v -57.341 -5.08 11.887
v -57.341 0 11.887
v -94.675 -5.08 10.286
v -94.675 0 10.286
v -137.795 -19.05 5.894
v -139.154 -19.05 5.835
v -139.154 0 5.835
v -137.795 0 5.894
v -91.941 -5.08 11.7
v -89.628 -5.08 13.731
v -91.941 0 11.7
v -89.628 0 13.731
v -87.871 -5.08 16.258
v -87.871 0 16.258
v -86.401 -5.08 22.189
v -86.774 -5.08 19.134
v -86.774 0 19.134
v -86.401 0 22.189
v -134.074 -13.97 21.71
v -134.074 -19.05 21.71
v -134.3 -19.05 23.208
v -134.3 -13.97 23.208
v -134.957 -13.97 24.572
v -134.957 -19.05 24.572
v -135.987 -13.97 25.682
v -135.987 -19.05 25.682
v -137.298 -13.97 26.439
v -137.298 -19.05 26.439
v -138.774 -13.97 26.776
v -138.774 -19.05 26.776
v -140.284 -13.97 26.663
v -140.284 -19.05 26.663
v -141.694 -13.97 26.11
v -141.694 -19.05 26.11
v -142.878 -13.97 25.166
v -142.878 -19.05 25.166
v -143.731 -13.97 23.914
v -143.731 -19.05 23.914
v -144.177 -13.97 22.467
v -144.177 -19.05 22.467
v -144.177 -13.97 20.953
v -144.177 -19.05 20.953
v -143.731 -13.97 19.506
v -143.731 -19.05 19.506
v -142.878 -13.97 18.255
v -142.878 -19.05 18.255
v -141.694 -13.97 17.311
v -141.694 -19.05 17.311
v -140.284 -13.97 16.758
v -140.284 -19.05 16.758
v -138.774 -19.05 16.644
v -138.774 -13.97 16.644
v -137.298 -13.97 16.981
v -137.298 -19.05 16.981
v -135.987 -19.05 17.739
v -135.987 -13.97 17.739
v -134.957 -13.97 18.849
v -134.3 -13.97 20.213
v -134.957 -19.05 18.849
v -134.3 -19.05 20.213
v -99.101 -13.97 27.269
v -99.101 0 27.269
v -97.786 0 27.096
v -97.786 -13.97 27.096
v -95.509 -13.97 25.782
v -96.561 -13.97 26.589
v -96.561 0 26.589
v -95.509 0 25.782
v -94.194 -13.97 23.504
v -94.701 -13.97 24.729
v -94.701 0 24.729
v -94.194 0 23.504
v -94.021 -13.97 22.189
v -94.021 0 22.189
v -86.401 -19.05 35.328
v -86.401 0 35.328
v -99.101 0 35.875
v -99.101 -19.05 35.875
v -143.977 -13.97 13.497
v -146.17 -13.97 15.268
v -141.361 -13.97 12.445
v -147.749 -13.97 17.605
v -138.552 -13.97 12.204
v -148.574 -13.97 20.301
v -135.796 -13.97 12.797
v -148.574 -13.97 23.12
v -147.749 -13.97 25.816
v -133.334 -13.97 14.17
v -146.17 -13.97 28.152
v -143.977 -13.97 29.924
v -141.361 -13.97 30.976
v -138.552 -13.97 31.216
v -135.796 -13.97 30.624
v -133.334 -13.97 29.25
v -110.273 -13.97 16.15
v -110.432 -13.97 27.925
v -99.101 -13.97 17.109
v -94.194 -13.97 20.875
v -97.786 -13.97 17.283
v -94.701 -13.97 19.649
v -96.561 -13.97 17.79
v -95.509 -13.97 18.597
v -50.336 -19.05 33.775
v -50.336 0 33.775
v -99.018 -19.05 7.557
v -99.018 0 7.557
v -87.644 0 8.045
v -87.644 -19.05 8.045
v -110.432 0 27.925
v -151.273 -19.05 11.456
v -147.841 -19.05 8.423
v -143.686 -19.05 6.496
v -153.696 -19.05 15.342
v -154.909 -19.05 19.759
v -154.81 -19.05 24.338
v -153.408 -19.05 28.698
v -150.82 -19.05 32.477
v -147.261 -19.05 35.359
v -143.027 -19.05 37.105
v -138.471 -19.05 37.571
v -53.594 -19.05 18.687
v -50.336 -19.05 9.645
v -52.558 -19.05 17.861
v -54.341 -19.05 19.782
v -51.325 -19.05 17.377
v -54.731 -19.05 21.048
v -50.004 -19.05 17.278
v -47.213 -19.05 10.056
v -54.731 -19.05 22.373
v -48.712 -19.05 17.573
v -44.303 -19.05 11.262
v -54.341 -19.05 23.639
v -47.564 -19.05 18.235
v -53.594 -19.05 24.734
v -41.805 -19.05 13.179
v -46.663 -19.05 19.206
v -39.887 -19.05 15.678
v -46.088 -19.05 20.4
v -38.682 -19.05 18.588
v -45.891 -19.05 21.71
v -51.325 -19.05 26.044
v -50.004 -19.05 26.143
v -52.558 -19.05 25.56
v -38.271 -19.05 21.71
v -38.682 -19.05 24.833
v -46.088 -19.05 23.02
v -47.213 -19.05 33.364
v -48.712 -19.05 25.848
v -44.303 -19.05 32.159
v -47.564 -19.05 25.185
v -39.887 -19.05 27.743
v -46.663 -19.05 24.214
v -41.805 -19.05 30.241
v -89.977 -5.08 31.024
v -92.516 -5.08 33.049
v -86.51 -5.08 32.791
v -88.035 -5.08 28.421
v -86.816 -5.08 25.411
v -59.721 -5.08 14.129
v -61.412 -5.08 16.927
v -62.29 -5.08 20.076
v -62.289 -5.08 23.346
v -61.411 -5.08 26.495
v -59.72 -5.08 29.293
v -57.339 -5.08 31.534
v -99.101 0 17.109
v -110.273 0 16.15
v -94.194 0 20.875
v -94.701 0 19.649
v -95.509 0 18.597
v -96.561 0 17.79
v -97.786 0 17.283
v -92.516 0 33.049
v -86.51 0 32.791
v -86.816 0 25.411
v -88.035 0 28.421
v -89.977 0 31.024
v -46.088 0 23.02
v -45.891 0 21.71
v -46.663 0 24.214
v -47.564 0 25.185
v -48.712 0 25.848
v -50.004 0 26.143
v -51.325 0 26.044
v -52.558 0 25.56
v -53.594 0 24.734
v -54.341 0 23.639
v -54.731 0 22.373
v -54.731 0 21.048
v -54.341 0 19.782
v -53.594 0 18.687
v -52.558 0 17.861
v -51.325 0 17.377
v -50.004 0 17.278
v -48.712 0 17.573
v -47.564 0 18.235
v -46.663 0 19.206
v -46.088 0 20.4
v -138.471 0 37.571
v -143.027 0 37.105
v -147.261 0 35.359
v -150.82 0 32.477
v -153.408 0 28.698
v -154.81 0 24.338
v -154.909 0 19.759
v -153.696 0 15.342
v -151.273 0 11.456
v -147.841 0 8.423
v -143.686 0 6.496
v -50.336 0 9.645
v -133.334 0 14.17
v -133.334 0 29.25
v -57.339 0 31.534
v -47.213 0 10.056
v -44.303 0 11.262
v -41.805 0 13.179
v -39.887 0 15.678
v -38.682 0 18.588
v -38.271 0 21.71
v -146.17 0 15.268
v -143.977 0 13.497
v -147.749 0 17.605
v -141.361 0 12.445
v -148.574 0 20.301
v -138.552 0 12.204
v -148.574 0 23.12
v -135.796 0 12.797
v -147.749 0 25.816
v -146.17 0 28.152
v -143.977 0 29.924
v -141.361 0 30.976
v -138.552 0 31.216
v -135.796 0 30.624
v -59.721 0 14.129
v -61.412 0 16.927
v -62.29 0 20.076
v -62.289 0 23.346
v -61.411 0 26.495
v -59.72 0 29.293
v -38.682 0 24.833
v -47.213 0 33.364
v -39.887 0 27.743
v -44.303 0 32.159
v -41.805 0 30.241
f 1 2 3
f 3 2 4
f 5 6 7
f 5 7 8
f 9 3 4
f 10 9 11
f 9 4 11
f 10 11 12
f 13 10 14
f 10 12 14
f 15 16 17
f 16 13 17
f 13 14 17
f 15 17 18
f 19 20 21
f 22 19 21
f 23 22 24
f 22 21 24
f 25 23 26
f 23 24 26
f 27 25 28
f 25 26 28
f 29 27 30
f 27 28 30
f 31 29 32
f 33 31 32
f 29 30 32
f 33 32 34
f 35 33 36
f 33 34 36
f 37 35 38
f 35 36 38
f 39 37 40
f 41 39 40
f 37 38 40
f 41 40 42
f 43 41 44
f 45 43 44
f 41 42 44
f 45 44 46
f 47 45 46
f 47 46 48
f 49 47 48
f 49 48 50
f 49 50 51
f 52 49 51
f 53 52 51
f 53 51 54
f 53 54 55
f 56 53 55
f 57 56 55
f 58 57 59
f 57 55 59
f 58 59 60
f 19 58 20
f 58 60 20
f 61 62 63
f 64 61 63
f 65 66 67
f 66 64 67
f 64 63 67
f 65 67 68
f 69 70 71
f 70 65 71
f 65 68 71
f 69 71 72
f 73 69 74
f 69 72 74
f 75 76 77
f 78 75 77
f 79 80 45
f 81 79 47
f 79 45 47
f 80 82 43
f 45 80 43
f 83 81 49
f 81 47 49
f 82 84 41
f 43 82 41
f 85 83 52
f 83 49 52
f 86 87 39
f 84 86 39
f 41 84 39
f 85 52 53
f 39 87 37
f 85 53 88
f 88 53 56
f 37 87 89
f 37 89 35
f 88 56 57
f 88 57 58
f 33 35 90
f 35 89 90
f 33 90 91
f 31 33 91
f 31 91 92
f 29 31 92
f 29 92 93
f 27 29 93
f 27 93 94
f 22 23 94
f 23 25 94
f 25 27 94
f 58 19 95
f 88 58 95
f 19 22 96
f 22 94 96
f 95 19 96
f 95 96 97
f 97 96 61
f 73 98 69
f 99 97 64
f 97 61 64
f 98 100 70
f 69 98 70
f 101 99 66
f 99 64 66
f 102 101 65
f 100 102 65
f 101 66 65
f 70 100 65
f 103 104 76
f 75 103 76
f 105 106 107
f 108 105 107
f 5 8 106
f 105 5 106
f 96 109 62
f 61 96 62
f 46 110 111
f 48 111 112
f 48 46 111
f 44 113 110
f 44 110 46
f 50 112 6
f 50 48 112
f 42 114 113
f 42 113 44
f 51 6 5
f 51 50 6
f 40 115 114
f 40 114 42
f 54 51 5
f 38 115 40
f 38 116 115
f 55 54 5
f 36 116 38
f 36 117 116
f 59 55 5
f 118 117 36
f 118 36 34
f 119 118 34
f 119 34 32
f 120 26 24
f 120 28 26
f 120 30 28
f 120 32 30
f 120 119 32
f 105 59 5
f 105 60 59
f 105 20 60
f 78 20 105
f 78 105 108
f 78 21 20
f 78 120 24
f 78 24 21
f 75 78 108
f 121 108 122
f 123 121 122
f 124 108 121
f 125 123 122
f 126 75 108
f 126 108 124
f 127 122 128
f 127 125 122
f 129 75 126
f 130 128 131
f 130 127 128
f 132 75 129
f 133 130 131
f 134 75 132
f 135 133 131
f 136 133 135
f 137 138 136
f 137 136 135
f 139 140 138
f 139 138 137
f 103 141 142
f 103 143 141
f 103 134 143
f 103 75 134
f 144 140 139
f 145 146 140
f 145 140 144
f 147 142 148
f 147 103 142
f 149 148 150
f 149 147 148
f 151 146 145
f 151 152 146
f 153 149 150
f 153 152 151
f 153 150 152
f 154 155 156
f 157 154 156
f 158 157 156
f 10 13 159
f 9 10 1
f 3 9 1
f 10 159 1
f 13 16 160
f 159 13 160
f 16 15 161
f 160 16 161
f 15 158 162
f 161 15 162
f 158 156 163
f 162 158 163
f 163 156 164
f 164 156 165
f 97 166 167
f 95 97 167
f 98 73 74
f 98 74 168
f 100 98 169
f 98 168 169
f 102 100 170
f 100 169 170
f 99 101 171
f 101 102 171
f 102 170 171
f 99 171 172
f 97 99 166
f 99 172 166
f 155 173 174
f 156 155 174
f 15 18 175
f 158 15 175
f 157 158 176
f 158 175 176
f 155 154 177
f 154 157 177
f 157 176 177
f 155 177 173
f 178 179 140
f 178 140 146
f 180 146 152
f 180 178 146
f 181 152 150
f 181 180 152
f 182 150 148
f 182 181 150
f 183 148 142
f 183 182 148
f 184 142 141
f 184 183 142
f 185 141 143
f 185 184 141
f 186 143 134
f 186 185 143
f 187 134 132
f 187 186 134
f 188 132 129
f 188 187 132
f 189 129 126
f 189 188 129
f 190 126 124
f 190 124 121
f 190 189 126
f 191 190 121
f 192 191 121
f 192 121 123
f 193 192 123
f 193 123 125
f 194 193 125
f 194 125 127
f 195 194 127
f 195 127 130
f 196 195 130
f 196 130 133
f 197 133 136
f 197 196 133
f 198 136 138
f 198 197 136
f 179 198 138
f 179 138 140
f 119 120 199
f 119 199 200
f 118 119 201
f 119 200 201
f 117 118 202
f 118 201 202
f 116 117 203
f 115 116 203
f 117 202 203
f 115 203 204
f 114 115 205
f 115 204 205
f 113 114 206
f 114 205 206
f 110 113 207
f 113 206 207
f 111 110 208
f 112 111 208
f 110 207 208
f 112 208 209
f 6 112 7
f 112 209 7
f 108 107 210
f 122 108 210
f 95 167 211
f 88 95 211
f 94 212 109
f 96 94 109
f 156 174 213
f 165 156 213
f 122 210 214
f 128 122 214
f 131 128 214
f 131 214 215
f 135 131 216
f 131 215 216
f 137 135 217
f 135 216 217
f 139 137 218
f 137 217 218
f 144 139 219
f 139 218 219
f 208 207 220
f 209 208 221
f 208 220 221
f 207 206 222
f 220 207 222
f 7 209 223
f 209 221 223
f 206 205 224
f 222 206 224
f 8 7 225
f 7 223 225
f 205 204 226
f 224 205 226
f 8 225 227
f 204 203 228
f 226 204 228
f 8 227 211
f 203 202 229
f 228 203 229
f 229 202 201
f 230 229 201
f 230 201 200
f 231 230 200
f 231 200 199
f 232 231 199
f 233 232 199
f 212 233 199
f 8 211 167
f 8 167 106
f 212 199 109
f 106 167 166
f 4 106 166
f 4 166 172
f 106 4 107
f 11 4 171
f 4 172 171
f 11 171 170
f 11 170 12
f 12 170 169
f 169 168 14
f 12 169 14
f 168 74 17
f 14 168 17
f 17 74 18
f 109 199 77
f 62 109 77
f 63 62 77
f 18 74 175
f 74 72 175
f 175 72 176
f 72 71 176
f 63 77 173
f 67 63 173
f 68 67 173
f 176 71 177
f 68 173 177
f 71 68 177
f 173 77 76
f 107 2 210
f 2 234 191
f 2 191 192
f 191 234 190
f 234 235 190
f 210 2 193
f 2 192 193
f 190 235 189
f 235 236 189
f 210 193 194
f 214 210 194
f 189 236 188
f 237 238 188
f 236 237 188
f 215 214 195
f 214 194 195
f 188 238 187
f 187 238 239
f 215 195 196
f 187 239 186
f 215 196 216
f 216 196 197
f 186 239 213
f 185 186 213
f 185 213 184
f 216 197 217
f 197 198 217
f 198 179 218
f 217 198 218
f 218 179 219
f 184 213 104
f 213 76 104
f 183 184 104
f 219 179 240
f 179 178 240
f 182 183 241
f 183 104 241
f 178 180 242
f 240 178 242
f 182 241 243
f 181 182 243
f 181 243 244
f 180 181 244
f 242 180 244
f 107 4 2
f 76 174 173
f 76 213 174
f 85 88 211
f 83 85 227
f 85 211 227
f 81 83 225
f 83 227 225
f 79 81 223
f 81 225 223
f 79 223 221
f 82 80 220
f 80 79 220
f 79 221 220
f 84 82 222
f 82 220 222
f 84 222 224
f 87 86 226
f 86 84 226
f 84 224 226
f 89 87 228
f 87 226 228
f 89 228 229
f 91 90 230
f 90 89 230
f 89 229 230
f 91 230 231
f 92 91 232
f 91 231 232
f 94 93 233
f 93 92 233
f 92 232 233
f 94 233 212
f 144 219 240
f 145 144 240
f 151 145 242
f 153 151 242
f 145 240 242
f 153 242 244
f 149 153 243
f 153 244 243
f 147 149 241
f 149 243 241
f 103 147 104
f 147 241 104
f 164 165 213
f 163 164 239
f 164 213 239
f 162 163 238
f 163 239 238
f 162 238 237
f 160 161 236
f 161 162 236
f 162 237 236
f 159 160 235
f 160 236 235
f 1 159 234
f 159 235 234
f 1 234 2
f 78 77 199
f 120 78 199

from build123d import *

# Parameters (mm, degrees)
F0_R     = 4.445
F1_DEPTH = 19.05
F3_DEPTH = 13.97
F4_R     = 5.08
F5_DEPTH = 5.08


with BuildPart() as f1:
    # F0 (on Front) → F1 (new body)
    with BuildSketch(Plane.XZ):
        with BuildLine():
            ThreePointArc((-124.9322268395, 28.7639294598), (-130.4980059639, 35.017678352), (-138.4710976488, 37.5705358593))
            ThreePointArc((-138.4710976488, 37.5705358593), (-155.0254015346, 22.0518028606), (-139.1540765762, 5.8352343242))
            Line((-139.1540765762, 5.8352343242), (-137.7946125004, 5.8935506507))
            ThreePointArc((-137.7946125004, 5.8935506507), (-130.1034423833, 8.6679321614), (-124.8131018813, 14.9019988847))
            Line((-124.8131018813, 14.9019988847), (-133.3336122029, 14.1704850261))
            ThreePointArc((-133.3336122029, 14.1704850261), (-148.6790765762, 21.7102343242), (-133.3336122029, 29.2499836224))
            Line((-133.3336122029, 29.2499836224), (-124.9322268395, 28.7639294598))
        make_face()
        with BuildLine():
            Line((-99.1008544222, 34.8894799677), (-99.1008544222, 35.8751666308))
            Line((-99.1008544222, 35.8751666308), (-138.4710976488, 37.5705358593))
            ThreePointArc((-138.4710976488, 37.5705358593), (-130.4980059639, 35.017678352), (-124.9322268395, 28.7639294598))
            Line((-124.9322268395, 28.7639294598), (-110.4319389367, 27.9250290893))
            ThreePointArc((-110.4319389367, 27.9250290893), (-105.7509869831, 33.0091720577), (-99.1008544222, 34.8894799677))
        make_face()
        with BuildLine():
            Line((-137.7946125004, 5.8935506507), (-99.0179549294, 7.5569357044))
            Line((-99.0179549294, 7.5569357044), (-99.1008544222, 9.4894799677))
            ThreePointArc((-99.1008544222, 9.4894799677), (-105.6044119808, 11.2810548255), (-110.273070294, 16.1503084588))
            Line((-110.273070294, 16.1503084588), (-124.8131018813, 14.9019988847))
            ThreePointArc((-124.8131018813, 14.9019988847), (-130.1034423833, 8.6679321614), (-137.7946125004, 5.8935506507))
        make_face()
        with BuildLine():
            ThreePointArc((-99.1008544222, 9.4894799677), (-96.8524942518, 9.6900849205), (-94.6751627721, 10.2855624017))
            ThreePointArc((-94.6751627721, 10.2855624017), (-88.6726167006, 14.9409036921), (-86.4008544222, 22.1894799677))
            Line((-86.4008544222, 22.1894799677), (-94.0208544222, 22.1894799677))
            ThreePointArc((-94.0208544222, 22.1894799677), (-95.5087519738, 18.5973775193), (-99.1008544222, 17.1094799677))
            Line((-99.1008544222, 17.1094799677), (-110.273070294, 16.1503084588))
            ThreePointArc((-110.273070294, 16.1503084588), (-105.6044119808, 11.2810548255), (-99.1008544222, 9.4894799677))
        make_face()
        with BuildLine():
            ThreePointArc((-86.4008544222, 22.1894799677), (-88.0348602906, 28.4211550137), (-92.5164093638, 33.0492720132))
            ThreePointArc((-92.5164093638, 33.0492720132), (-95.6824746143, 34.4207791419), (-99.1008544222, 34.8894799677))
            ThreePointArc((-99.1008544222, 34.8894799677), (-105.7509869831, 33.0091720577), (-110.4319389367, 27.9250290893))
            Line((-110.4319389367, 27.9250290893), (-99.1008544222, 27.2694799677))
            ThreePointArc((-99.1008544222, 27.2694799677), (-95.5087519738, 25.7815824161), (-94.0208544222, 22.1894799677))
            Line((-94.0208544222, 22.1894799677), (-86.4008544222, 22.1894799677))
        make_face()
        with BuildLine():
            Line((-99.0179549294, 7.5569357044), (-87.6442336226, 8.0448291746))
            Line((-87.6442336226, 8.0448291746), (-87.7530907655, 10.5824954495))
            Line((-87.7530907655, 10.5824954495), (-94.6751627721, 10.2855624017))
            ThreePointArc((-94.6751627721, 10.2855624017), (-96.8524942518, 9.6900849205), (-99.1008544222, 9.4894799677))
            Line((-99.1008544222, 9.4894799677), (-99.0179549294, 7.5569357044))
        make_face()
        with BuildLine():
            Line((-86.5101311345, 32.7906284679), (-86.4008544222, 35.3282767099))
            Line((-86.4008544222, 35.3282767099), (-99.1008544222, 35.8751666308))
            Line((-99.1008544222, 35.8751666308), (-99.1008544222, 34.8894799677))
            ThreePointArc((-99.1008544222, 34.8894799677), (-95.6824746143, 34.4207791419), (-92.5164093638, 33.0492720132))
            Line((-92.5164093638, 33.0492720132), (-86.5101311345, 32.7906284679))
        make_face()
        with BuildLine():
            ThreePointArc((-57.3392350777, 31.5344655517), (-54.0123637648, 33.2013955962), (-50.3357569569, 33.7752343242))
            Line((-50.3357569569, 33.7752343242), (-86.4008544222, 35.3282767099))
            Line((-86.4008544222, 35.3282767099), (-86.5101311345, 32.7906284679))
            Line((-86.5101311345, 32.7906284679), (-57.3392350777, 31.5344655517))
        make_face()
        with BuildLine():
            Line((-87.6442336226, 8.0448291746), (-50.3357569569, 9.6452343242))
            ThreePointArc((-50.3357569569, 9.6452343242), (-54.0132473827, 10.2193558039), (-57.3407458906, 11.8870802972))
            Line((-57.3407458906, 11.8870802972), (-87.7530907655, 10.5824954495))
            Line((-87.7530907655, 10.5824954495), (-87.6442336226, 8.0448291746))
        make_face()
        with BuildLine():
            ThreePointArc((-50.3357569569, 9.6452343242), (-41.8045136419, 13.1789910092), (-38.2707569569, 21.7102343242))
            ThreePointArc((-38.2707569569, 21.7102343242), (-41.8045136419, 30.2414776392), (-50.3357569569, 33.7752343242))
            ThreePointArc((-50.3357569569, 33.7752343242), (-54.0123637648, 33.2013955962), (-57.3392350777, 31.5344655517))
            ThreePointArc((-57.3392350777, 31.5344655517), (-62.4007569212, 21.7111620791), (-57.3407458906, 11.8870802972))
            ThreePointArc((-57.3407458906, 11.8870802972), (-54.0132473827, 10.2193558039), (-50.3357569569, 9.6452343242))
        make_face()
        with Locations((-50.3357569569, 21.7102343242)):
            Circle(F0_R, mode=Mode.SUBTRACT)
    extrude(amount=F1_DEPTH)

    # F2 (on face) → F3 (join)
    with BuildSketch(Plane.XZ.offset(19.05)):
        with BuildLine():
            ThreePointArc((-86.4008544222, 22.1894799677), (-88.6726167006, 14.9409036921), (-94.6751627721, 10.2855624017))
            Line((-94.6751627721, 10.2855624017), (-57.3407458906, 11.8870802972))
            ThreePointArc((-57.3407458906, 11.8870802972), (-62.4007569212, 21.7111620791), (-57.3392350777, 31.5344655517))
            Line((-57.3392350777, 31.5344655517), (-92.5164093638, 33.0492720132))
            ThreePointArc((-92.5164093638, 33.0492720132), (-88.0348602906, 28.4211550137), (-86.4008544222, 22.1894799677))
        make_face()
        with BuildLine():
            Line((-57.3407458906, 11.8870802972), (-94.6751627721, 10.2855624017))
            ThreePointArc((-94.6751627721, 10.2855624017), (-103.5704974557, 10.301995324), (-110.273070294, 16.1503084588))
            Line((-110.273070294, 16.1503084588), (-133.3336122029, 14.1704850261))
            ThreePointArc((-133.3336122029, 14.1704850261), (-148.6790765762, 21.7102343242), (-133.3336122029, 29.2499836224))
            Line((-133.3336122029, 29.2499836224), (-110.4319389367, 27.9250290893))
            ThreePointArc((-110.4319389367, 27.9250290893), (-102.5932909524, 34.3998397938), (-92.5164093638, 33.0492720132))
            Line((-92.5164093638, 33.0492720132), (-57.3392350777, 31.5344655517))
            ThreePointArc((-57.3392350777, 31.5344655517), (-54.0123637648, 33.2013955962), (-50.3357569569, 33.7752343242))
            Line((-50.3357569569, 33.7752343242), (-138.4710976488, 37.5705358593))
            ThreePointArc((-138.4710976488, 37.5705358593), (-155.0254015346, 22.0518028606), (-139.1540765762, 5.8352343242))
            Line((-139.1540765762, 5.8352343242), (-50.3357569569, 9.6452343242))
            ThreePointArc((-50.3357569569, 9.6452343242), (-54.0132473827, 10.2193558039), (-57.3407458906, 11.8870802972))
        make_face()
    extrude(amount=-F3_DEPTH)

    # F4 (on face) → F5 (join)
    with BuildSketch(Plane.XZ.offset(19.05)):
        with BuildLine():
            ThreePointArc((-133.3336122029, 29.2499836224), (-148.6790765762, 21.7102343242), (-133.3336122029, 14.1704850261))
            ThreePointArc((-133.3336122029, 14.1704850261), (-130.6052302168, 17.5098949424), (-129.6290765762, 21.7102343242))
            ThreePointArc((-129.6290765762, 21.7102343242), (-130.6052302168, 25.910573706), (-133.3336122029, 29.2499836224))
        make_face()
        with Locations((-139.1540765762, 21.7102343242)):
            Circle(F4_R, mode=Mode.SUBTRACT)
        with BuildLine():
            ThreePointArc((-129.6290765762, 21.7102343242), (-130.6052302168, 17.5098949424), (-133.3336122029, 14.1704850261))
            Line((-133.3336122029, 14.1704850261), (-99.1008544222, 17.1094799677))
            ThreePointArc((-99.1008544222, 17.1094799677), (-104.1808544222, 22.1894799677), (-99.1008544222, 27.2694799677))
            Line((-99.1008544222, 27.2694799677), (-133.3336122029, 29.2499836224))
            ThreePointArc((-133.3336122029, 29.2499836224), (-130.6052302168, 25.910573706), (-129.6290765762, 21.7102343242))
        make_face()
        with BuildLine():
            ThreePointArc((-99.1008544222, 27.2694799677), (-104.1808544222, 22.1894799677), (-99.1008544222, 17.1094799677))
            ThreePointArc((-99.1008544222, 17.1094799677), (-95.5087519738, 18.5973775193), (-94.0208544222, 22.1894799677))
            ThreePointArc((-94.0208544222, 22.1894799677), (-95.5087519738, 25.7815824161), (-99.1008544222, 27.2694799677))
        make_face()
    extrude(amount=-F5_DEPTH)


solid = f1.part
